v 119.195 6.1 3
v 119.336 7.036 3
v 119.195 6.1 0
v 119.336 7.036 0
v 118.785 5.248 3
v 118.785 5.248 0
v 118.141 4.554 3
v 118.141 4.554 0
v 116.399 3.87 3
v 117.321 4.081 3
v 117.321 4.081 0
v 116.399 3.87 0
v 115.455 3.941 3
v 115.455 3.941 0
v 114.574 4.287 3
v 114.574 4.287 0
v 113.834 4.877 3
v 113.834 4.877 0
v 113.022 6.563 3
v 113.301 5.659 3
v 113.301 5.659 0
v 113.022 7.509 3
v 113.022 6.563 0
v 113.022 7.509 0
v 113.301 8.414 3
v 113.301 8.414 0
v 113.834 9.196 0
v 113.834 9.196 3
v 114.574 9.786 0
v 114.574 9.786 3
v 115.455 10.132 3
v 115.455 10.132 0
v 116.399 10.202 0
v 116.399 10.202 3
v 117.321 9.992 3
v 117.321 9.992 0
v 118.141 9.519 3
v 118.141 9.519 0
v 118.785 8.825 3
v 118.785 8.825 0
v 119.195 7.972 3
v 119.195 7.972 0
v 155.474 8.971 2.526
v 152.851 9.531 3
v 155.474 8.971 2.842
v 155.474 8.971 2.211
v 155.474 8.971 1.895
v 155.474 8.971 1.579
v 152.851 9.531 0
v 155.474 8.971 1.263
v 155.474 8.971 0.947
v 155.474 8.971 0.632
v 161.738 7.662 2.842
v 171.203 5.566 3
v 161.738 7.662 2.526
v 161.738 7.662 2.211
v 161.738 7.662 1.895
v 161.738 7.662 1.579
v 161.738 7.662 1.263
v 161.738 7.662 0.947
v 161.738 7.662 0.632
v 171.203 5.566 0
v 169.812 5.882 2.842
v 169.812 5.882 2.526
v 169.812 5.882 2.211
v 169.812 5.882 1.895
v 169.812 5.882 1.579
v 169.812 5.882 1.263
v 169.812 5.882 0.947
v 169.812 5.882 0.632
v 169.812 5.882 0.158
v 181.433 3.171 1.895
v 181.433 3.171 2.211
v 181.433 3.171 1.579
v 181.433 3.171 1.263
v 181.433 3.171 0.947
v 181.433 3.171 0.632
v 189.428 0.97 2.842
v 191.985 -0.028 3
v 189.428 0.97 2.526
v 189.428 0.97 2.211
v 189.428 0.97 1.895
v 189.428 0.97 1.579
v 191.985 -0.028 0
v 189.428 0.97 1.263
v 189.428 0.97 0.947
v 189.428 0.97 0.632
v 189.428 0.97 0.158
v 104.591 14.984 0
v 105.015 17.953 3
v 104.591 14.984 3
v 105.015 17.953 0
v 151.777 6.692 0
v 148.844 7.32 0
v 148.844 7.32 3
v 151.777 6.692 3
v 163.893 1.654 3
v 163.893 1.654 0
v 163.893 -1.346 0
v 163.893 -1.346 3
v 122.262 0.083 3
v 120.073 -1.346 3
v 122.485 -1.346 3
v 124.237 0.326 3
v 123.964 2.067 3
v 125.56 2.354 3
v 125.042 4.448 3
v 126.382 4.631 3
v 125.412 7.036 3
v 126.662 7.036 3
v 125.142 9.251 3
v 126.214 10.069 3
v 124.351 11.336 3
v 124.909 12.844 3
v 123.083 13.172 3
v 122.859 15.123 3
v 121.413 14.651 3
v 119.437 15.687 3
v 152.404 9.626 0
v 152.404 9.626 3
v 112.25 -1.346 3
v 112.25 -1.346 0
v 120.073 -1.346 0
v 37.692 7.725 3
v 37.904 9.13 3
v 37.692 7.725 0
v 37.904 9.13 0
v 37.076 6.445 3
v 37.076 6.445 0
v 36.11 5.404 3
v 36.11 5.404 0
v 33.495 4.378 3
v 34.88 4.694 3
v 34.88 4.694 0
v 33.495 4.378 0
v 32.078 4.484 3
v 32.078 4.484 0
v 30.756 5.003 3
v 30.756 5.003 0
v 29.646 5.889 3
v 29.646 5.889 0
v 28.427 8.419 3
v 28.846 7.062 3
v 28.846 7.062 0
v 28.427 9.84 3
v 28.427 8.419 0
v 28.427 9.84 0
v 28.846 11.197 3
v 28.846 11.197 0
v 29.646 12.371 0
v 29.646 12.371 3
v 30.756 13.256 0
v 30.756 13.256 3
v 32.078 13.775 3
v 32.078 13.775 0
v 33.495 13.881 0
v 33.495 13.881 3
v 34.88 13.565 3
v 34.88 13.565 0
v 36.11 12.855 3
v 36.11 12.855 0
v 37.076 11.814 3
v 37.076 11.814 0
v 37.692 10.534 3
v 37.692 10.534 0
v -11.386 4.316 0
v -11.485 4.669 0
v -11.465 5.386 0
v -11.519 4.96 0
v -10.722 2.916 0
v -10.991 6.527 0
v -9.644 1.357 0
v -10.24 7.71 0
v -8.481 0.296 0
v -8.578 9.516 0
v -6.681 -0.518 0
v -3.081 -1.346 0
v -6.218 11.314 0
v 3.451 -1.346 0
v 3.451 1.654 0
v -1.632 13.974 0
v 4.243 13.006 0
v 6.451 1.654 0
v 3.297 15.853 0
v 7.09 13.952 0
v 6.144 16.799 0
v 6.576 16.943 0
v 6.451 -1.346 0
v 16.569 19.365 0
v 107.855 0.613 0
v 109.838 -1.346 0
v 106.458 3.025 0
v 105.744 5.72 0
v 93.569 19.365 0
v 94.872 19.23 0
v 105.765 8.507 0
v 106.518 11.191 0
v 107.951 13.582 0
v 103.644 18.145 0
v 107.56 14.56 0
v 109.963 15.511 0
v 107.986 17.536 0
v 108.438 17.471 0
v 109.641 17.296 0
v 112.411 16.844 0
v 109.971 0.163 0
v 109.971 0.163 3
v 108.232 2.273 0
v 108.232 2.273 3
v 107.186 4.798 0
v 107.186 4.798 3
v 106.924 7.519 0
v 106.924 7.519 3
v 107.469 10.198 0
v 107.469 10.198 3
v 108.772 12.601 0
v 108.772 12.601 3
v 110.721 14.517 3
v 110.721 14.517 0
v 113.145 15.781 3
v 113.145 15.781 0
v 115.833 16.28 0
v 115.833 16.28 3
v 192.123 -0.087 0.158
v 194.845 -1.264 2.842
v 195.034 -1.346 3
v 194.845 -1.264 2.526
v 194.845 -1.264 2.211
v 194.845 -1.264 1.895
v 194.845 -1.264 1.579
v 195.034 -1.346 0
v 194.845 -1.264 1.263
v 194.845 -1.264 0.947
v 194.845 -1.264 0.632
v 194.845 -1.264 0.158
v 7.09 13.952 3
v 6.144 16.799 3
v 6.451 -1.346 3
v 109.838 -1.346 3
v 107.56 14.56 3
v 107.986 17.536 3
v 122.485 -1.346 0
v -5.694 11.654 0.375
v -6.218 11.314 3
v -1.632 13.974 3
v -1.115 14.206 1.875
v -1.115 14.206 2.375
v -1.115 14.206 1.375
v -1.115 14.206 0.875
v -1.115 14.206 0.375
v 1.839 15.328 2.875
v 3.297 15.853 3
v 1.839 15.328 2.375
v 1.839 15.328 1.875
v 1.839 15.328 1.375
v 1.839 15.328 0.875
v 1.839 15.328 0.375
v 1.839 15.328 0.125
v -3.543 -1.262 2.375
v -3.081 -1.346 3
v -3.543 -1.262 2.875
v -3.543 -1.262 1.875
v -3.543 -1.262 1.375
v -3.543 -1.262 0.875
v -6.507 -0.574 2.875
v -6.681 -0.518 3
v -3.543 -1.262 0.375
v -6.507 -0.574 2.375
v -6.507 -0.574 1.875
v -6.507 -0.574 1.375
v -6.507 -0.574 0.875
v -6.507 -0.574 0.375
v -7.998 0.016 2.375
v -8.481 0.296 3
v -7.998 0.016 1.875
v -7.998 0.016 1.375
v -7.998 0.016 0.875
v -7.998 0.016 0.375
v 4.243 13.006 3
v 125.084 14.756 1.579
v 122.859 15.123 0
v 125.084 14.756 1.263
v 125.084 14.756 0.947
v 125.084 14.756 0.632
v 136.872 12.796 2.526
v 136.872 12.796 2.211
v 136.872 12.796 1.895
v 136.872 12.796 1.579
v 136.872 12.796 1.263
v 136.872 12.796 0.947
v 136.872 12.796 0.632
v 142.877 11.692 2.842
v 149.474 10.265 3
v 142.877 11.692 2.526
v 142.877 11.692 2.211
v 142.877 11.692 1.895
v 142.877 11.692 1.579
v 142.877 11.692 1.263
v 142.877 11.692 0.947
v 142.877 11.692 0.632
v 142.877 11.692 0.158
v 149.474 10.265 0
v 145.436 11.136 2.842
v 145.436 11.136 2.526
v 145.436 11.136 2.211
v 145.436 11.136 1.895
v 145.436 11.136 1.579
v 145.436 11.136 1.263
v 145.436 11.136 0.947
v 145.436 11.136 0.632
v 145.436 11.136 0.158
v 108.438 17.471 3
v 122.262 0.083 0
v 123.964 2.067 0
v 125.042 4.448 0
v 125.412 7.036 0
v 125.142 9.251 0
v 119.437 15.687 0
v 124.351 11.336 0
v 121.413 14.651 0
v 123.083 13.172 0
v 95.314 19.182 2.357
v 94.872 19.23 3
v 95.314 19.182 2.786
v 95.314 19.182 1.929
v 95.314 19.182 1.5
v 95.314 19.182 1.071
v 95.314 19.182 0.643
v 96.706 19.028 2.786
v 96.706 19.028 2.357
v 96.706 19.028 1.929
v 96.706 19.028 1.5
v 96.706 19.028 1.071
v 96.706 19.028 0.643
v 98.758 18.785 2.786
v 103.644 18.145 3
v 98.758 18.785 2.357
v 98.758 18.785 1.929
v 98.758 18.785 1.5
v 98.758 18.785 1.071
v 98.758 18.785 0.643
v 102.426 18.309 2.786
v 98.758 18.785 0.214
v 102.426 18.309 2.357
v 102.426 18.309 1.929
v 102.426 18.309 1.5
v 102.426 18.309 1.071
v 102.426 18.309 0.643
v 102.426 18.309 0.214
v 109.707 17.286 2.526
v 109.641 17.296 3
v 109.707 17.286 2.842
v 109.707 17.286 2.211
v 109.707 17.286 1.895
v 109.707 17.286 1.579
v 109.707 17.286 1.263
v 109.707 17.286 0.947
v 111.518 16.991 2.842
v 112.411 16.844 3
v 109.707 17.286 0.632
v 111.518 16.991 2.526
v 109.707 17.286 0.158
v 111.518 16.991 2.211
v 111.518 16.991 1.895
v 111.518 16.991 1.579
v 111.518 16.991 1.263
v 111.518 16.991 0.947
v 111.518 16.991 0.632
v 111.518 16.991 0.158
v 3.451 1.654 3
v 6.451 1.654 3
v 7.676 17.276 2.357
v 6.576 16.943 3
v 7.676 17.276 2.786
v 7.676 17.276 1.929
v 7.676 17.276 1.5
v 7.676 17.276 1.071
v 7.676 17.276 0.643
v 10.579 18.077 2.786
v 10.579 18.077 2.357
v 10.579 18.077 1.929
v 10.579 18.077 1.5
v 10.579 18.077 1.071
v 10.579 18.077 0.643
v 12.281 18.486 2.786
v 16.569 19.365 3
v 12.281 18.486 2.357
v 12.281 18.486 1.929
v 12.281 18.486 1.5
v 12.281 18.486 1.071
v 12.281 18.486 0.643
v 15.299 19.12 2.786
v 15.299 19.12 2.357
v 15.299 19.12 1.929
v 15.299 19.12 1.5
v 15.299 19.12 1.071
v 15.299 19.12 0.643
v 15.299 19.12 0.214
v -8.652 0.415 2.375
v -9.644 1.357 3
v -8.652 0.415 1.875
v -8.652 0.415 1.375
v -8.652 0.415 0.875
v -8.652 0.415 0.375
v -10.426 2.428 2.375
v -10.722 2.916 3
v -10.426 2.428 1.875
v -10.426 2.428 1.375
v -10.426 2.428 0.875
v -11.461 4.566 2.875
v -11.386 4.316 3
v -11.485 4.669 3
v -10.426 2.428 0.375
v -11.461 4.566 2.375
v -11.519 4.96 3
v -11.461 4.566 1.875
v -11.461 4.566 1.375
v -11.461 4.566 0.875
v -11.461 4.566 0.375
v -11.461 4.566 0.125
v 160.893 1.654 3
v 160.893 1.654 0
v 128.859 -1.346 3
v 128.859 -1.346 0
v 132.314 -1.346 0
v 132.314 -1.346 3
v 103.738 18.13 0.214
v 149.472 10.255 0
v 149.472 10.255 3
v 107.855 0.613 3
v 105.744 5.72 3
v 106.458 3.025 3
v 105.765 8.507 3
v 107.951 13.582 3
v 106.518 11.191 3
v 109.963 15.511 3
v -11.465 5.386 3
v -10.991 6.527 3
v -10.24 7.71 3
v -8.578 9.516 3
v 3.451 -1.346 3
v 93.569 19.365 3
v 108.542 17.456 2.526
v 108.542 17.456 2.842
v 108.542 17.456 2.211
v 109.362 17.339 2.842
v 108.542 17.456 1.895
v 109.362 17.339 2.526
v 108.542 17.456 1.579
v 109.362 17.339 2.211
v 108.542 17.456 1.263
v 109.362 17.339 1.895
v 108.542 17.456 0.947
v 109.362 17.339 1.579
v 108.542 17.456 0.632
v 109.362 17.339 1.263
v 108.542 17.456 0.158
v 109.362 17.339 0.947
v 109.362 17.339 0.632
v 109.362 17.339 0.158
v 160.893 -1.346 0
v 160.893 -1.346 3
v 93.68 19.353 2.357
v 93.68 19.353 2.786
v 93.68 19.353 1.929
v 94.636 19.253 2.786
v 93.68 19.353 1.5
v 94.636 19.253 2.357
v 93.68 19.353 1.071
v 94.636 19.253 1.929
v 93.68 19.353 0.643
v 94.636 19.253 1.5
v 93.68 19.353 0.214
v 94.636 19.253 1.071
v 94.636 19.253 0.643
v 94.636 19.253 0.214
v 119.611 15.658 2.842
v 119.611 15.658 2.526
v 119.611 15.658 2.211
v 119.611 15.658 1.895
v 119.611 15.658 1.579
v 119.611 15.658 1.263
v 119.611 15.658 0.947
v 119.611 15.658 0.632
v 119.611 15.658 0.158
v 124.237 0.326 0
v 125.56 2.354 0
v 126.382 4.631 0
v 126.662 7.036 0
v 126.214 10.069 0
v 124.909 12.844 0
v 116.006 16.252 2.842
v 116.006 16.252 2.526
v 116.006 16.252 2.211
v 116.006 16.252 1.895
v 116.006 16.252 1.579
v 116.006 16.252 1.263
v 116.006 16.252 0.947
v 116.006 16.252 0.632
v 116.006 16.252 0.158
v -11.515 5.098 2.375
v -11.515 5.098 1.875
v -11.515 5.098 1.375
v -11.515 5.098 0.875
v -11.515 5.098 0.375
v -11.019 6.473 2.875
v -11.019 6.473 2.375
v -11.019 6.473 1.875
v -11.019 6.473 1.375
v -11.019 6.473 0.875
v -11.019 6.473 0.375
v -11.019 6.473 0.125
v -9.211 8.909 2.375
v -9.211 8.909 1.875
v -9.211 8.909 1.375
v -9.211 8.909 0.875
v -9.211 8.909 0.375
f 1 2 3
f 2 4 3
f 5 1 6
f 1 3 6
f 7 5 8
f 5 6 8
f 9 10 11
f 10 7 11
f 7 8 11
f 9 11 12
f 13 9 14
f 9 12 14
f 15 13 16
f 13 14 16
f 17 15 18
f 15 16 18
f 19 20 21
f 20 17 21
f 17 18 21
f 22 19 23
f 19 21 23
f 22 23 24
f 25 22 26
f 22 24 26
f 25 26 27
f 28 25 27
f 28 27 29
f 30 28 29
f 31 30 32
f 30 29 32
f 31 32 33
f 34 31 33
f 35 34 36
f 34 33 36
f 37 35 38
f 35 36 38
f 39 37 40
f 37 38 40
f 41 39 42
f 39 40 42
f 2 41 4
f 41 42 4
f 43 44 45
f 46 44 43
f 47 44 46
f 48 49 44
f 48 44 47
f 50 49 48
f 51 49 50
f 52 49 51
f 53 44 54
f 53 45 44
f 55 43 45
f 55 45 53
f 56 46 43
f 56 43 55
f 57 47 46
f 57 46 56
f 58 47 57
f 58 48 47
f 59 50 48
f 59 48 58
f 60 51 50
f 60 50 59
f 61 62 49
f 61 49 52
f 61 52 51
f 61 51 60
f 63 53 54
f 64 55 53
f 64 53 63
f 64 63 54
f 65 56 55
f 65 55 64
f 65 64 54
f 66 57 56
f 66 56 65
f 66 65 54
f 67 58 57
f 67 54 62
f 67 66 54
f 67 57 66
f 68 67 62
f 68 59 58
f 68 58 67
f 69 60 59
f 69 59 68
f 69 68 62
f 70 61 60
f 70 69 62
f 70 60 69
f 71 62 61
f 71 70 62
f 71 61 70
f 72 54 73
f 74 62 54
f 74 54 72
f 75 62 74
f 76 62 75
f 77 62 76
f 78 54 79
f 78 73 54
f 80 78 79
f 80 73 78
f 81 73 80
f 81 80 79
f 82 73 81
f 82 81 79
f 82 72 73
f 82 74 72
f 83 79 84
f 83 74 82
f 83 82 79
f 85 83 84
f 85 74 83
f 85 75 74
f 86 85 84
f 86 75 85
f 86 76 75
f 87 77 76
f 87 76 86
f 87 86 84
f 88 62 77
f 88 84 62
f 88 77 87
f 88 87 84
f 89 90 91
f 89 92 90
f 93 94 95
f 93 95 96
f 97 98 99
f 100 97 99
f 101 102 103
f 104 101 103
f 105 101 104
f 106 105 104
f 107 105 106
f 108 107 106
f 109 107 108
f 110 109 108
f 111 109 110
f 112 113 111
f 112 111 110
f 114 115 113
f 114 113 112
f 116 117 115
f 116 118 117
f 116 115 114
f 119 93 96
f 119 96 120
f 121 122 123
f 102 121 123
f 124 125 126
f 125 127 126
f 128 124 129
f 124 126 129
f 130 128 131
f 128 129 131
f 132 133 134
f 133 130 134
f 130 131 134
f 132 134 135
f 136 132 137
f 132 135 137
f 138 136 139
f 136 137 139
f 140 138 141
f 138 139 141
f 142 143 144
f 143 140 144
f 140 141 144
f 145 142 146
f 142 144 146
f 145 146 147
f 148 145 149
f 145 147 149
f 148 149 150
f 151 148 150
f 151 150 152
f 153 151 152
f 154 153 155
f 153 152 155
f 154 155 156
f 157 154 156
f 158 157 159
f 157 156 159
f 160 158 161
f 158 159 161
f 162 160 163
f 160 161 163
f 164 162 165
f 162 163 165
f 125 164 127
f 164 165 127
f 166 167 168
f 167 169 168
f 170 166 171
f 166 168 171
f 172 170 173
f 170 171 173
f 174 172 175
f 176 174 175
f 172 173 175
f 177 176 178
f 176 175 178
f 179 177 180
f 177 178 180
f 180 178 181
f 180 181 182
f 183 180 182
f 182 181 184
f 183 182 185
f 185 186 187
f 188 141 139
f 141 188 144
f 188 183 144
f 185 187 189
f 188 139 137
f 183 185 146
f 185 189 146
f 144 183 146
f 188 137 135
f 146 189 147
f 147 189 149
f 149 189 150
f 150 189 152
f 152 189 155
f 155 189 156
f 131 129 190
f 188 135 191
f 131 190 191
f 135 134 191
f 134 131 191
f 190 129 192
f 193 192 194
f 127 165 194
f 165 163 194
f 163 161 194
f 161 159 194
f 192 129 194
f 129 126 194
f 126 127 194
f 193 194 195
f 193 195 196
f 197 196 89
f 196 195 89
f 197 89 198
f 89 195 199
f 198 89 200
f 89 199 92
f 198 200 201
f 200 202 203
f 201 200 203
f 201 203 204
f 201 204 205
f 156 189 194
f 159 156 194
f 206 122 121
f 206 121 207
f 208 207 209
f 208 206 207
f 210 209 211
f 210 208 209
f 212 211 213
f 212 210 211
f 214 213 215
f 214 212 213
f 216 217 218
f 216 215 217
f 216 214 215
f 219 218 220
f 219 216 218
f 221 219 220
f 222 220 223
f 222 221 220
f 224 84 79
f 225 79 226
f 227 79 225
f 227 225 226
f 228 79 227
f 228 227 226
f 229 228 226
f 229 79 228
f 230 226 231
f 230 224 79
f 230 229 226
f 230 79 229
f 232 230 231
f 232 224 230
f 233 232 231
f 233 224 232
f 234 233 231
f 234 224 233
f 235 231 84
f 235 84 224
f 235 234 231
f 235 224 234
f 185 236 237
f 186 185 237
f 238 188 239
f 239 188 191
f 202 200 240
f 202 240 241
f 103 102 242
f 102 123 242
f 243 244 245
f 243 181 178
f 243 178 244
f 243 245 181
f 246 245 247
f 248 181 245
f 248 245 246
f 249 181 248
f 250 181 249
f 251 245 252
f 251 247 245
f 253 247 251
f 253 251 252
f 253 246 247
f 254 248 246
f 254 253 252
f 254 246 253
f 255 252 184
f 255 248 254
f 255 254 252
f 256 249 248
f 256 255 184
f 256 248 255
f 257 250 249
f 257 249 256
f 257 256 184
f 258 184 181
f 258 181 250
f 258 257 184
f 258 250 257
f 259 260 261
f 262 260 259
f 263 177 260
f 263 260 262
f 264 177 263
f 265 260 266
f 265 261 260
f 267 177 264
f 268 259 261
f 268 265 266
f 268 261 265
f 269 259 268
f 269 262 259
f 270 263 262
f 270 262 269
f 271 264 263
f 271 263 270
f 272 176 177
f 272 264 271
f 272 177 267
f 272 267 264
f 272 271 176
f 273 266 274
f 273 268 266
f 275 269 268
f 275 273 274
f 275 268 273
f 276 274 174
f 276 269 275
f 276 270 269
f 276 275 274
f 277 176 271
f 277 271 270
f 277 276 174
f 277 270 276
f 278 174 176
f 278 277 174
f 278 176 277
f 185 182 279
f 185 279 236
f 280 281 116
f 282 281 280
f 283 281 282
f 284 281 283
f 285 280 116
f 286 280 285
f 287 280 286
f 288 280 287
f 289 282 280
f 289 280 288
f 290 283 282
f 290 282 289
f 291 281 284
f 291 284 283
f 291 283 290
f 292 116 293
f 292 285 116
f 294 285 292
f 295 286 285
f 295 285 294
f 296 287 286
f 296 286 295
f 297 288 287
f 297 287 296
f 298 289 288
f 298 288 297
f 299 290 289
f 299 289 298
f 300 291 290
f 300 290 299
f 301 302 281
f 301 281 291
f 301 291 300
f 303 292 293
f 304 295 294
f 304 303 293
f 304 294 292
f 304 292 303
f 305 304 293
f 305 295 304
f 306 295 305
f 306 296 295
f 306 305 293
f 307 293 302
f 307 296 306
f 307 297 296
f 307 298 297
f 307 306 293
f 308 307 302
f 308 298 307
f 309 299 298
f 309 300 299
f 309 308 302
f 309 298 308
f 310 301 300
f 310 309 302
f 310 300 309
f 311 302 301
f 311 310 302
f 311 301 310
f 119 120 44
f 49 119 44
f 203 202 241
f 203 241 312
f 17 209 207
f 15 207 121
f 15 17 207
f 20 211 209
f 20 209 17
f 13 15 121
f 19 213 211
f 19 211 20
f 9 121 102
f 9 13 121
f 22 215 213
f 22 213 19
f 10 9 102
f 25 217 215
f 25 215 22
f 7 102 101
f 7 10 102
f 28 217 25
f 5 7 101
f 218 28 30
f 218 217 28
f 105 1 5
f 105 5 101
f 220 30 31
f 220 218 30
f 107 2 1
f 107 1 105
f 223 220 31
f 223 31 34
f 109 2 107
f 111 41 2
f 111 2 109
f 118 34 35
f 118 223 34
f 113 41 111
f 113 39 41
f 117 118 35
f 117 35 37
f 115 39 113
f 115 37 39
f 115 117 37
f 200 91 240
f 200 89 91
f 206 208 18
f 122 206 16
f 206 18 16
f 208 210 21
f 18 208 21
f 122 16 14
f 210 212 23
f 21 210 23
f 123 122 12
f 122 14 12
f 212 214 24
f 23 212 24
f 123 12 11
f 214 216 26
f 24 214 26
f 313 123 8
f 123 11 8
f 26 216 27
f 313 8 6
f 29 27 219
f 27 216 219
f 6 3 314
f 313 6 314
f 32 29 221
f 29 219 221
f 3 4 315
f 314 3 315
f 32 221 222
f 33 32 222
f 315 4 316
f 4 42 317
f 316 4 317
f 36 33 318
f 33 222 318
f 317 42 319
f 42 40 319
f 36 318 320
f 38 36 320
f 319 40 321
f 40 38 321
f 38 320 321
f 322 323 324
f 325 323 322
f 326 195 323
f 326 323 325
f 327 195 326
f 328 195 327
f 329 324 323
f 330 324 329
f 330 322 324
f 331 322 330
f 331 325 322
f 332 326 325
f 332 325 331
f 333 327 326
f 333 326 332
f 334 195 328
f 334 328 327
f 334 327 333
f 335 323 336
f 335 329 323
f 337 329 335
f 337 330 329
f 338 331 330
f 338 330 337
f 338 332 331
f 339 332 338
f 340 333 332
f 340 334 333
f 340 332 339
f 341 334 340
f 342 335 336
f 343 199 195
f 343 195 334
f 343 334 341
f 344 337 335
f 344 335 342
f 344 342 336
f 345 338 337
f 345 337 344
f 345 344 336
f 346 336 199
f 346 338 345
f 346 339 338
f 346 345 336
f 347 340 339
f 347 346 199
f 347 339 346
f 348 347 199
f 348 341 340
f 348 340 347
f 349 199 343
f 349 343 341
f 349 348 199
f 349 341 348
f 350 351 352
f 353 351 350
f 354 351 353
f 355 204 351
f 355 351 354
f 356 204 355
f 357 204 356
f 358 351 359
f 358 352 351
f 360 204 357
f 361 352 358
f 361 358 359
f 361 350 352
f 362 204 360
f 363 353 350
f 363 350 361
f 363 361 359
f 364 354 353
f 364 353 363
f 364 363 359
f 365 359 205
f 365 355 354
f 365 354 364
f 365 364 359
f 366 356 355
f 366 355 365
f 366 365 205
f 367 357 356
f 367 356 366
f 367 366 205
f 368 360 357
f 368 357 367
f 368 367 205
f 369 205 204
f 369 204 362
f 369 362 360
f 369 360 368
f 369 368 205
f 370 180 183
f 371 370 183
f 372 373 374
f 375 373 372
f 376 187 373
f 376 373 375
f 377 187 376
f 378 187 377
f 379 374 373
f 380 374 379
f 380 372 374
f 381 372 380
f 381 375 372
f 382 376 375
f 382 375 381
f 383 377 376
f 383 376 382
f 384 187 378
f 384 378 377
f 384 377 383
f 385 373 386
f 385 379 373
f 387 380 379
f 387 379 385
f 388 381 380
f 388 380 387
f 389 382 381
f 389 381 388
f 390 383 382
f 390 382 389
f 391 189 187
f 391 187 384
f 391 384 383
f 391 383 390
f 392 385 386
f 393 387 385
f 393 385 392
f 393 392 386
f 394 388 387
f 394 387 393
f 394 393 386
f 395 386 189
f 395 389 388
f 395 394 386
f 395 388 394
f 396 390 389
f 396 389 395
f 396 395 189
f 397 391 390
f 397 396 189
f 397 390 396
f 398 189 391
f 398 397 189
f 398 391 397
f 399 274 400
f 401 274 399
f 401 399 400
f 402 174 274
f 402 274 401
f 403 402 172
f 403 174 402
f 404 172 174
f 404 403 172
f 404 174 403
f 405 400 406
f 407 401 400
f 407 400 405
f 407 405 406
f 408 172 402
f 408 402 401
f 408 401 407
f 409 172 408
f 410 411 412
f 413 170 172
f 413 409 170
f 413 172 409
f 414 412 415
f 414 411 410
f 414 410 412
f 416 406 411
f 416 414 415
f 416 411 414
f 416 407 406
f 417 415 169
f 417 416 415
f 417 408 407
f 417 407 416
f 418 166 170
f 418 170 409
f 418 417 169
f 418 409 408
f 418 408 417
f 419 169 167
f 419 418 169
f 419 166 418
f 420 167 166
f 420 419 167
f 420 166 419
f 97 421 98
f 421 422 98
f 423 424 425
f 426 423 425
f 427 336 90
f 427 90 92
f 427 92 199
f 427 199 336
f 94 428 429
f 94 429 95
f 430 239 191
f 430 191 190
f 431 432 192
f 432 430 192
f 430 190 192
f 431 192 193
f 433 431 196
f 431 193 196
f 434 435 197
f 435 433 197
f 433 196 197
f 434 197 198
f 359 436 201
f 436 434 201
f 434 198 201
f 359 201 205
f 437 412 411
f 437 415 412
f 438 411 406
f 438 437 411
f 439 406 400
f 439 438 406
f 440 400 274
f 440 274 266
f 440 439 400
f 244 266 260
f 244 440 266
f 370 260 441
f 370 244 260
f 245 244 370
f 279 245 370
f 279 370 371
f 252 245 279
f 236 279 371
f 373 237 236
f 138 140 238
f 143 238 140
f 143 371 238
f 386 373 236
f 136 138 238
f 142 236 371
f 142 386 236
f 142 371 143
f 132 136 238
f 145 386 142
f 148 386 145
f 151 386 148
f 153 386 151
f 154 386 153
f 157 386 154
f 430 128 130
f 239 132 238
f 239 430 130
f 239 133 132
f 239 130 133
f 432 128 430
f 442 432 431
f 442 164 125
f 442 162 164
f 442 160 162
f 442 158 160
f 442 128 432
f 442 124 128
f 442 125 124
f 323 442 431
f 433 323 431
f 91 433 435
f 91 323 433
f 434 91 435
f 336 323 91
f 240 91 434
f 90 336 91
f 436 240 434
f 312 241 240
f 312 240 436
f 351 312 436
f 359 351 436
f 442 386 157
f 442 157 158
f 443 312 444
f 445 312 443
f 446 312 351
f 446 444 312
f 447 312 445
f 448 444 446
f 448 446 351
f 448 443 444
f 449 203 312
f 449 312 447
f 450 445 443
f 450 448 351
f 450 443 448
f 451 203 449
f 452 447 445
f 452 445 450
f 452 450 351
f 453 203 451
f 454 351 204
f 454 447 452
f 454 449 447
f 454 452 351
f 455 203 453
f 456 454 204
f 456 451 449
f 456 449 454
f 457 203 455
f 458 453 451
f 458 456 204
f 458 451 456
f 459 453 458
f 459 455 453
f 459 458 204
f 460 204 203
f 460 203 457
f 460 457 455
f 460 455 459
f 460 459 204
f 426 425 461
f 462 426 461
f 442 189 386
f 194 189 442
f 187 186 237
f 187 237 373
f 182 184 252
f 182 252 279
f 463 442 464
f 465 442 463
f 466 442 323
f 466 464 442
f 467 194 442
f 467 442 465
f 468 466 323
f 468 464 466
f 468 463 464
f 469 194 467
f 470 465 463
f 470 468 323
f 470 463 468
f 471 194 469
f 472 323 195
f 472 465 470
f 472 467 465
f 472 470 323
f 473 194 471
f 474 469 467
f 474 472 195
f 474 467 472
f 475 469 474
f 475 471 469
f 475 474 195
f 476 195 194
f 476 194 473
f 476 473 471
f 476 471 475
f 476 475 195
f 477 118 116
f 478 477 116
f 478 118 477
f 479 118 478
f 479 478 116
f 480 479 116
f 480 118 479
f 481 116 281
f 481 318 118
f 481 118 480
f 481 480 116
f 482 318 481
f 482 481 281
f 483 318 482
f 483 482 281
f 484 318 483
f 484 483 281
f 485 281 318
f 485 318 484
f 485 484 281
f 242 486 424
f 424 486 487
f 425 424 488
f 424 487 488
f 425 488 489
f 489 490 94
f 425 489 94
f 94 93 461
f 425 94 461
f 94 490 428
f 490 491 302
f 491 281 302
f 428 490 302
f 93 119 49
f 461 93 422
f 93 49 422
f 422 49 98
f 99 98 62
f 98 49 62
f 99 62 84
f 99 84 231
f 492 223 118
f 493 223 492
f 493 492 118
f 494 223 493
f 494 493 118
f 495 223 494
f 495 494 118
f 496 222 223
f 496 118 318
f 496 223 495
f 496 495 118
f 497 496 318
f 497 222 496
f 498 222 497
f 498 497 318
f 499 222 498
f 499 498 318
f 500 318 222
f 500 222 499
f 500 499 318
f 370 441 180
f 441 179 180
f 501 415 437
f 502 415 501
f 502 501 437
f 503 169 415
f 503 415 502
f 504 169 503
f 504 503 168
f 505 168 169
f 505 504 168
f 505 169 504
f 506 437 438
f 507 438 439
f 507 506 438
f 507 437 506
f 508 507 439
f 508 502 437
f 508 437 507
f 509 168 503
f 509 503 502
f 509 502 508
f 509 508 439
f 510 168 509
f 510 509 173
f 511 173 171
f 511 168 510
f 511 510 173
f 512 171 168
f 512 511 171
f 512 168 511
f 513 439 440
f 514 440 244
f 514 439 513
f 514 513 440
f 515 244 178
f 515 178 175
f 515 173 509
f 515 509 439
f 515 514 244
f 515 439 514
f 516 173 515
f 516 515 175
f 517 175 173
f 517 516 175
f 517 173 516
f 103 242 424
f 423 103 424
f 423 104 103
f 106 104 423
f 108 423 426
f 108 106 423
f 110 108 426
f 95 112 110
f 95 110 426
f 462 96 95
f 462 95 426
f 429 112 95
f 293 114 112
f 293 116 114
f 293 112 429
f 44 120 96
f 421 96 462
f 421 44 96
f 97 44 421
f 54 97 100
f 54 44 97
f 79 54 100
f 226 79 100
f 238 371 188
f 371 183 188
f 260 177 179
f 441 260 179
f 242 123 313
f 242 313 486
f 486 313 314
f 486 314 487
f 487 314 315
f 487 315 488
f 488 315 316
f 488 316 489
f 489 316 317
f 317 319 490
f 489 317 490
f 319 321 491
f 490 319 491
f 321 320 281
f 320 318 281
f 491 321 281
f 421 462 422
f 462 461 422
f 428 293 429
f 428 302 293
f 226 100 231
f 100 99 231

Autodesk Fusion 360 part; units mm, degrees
sketch "Sketch1" plane through (0, 0, 0) normal (0, 0, 1) x (1, 0, 0) in component "Airfoil structure"
  spline S0 degree 5 poles (108.4381, 17.4711) (108.649, 17.4404) (108.9954, 17.3905) (109.2888, 17.35) (109.4947, 17.3216) (110.5176, 17.1554) (112.7992, 16.78) (116.3579, 16.1938) (120.8926, 15.4471) (125.9053, 14.6214) (130.826, 13.8088) (135.1336, 13.0925) (138.4727, 12.5267) (140.7909, 12.1145) (142.442, 11.7905) (143.9925, 11.4539) (145.6494, 11.0874) (147.355, 10.7177) (148.7282, 10.4238) (149.4739, 10.265) knots 0 0 0 0 0 0 0.066667 0.133333 0.2 0.266667 0.333333 0.4 0.466667 0.533333 0.6 0.666667 0.733333 0.8 0.866667 0.933333 1 1 1 1 1 1
  line L0 (104.3157, 18.0708) -> (112.5606, 16.8713)
  line L1 (145.4959, 11.1121) -> (153.4519, 9.4178)
  spline S1 degree 5 poles (152.8506, 9.5306) (153.6754, 9.3537) (155.1958, 9.0286) (157.0885, 8.6275) (158.936, 8.2427) (160.6637, 7.8882) (162.4454, 7.5152) (164.8302, 6.998) (168.0436, 6.2836) (171.9512, 5.3995) (176.2203, 4.4165) (180.4192, 3.4262) (184.1363, 2.5128) (187.0894, 1.7283) (189.2467, 1.0647) (190.9412, 0.4271) (192.3181, -0.1661) (193.5665, -0.7107) (194.5238, -1.1255) (195.0337, -1.3459) knots 0 0 0 0 0 0 0.066667 0.133333 0.2 0.266667 0.333333 0.4 0.466667 0.533333 0.6 0.666667 0.733333 0.8 0.866667 0.933333 1 1 1 1 1 1
  line L2 (148.4907, 10.4656) -> (157.2105, 8.5955)
  line L3 (191.9852, -0.0284) -> (198.0822, -2.6634)
  circle A0 centre (33.1388, 9.1296) radius 4.765
  circle A1 centre (116.1615, 7.0362) radius 3.175
  spline S2 degree 5 poles (-3.081, -1.3459) (-3.6016, -1.2531) (-4.5413, -1.0758) (-5.6462, -0.8349) (-6.5938, -0.5667) (-7.329, -0.2952) (-8.0514, 0.0089) (-9.0194, 0.5708) (-10.0684, 1.7874) (-10.9642, 3.2519) (-11.5103, 4.4866) (-11.5777, 5.0951) (-11.407, 5.643) (-11.0112, 6.6068) (-10.1307, 7.993) (-8.6022, 9.6432) (-6.4034, 11.2721) (-4.1965, 12.5716) (-2.7349, 13.4061) (-1.8316, 13.8946) (-1.0216, 14.2664) (0.0955, 14.6934) (1.459, 15.1917) (2.6392, 15.6173) (3.2971, 15.8534) knots 0 0 0 0 0 0 0.05 0.1 0.15 0.2 0.25 0.3 0.35 0.4 0.45 0.5 0.55 0.6 0.65 0.7 0.75 0.8 0.85 0.9 0.95 1 1 1 1 1 1
  line L4 (0.5703, -1.9966) -> (-6.7323, -0.6952)
  line L5 (-0.0118, 14.6656) -> (6.606, 17.0412)
  line L6 (-8.4792, 9.8153) -> (-3.9569, 12.8132)
  line L7 (-11.5034, 4.2257) -> (-11.5345, 5.6935)
  line L8 (-7.2174, -0.5359) -> (-9.7443, 1.1286)
  line L9 (16.5688, 19.3646) -> (93.5688, 19.3646)
  spline S3 degree 5 poles (93.5688, 19.3646) (93.8188, 19.3387) (94.2829, 19.2905) (94.8714, 19.229) (95.4658, 19.1659) (96.0263, 19.1049) (96.567, 19.0445) (97.2368, 18.9678) (98.1315, 18.8622) (99.3129, 18.7173) (100.8213, 18.5245) (102.3116, 18.3263) (103.5971, 18.1504) (104.5298, 18.0208) (105.015, 17.9529) knots 0 0 0 0 0 0 0.1 0.2 0.3 0.4 0.5 0.6 0.7 0.8 0.9 1 1 1 1 1 1
  line L10 (92.266, 19.4996) -> (94.8715, 19.2297)
  line L11 (103.6445, 18.1447) -> (106.3855, 17.761)
  spline S4 degree 5 poles (6.5765, 16.943) (6.9079, 17.0449) (7.5374, 17.2364) (8.3817, 17.4868) (9.3156, 17.7508) (10.2084, 17.9865) (10.8922, 18.156) (11.4504, 18.29) (11.9864, 18.4184) (12.6265, 18.5675) (13.504, 18.76) (14.4962, 18.9637) (15.447, 19.1503) (16.1786, 19.2906) (16.5688, 19.3646) knots 0 0 0 0 0 0 0.1 0.2 0.3 0.4 0.5 0.6 0.7 0.8 0.9 1 1 1 1 1 1
  line L12 (5.4107, 16.5846) -> (7.7424, 17.3015)
  line L13 (15.2328, 19.111) -> (17.9048, 19.6183)
  line L14 (152.4045, 9.626) -> (152.8506, 9.5306)
  line L15 (107.9857, 17.5357) -> (108.4381, 17.4711)
  line L16 (6.1441, 16.7993) -> (6.5765, 16.943)
  line L17 (128.8588, -1.3459) -> (132.3138, -1.3459)
  line L18 (149.4739, 10.265) -> (148.8437, 7.3202)
  line L19 (148.8437, 7.3202) -> (151.7767, 6.6924)
  line L20 (151.7767, 6.6924) -> (152.4045, 9.626)
  line L21 (105.015, 17.9529) -> (104.5907, 14.9843)
  line L22 (104.5907, 14.9843) -> (107.5603, 14.5598)
  line L23 (107.5603, 14.5598) -> (107.9857, 17.5357)
  line L24 (3.2971, 15.8534) -> (4.243, 13.0064)
  line L25 (4.243, 13.0064) -> (7.09, 13.9524)
  line L26 (7.09, 13.9524) -> (6.1441, 16.7993)
  line L27 (160.8934, -1.3459) -> (160.8934, 1.6536)
  line L28 (160.8934, 1.6536) -> (163.8934, 1.6536)
  line L29 (163.8934, 1.6536) -> (163.8934, -1.3459)
  line L30 (132.3138, -1.3459) -> (160.8934, -1.3459)
  line L31 (163.8934, -1.3459) -> (195.0337, -1.3459)
  line L32 (3.4513, -1.3459) -> (3.4513, 1.6536)
  line L33 (3.4513, 1.6536) -> (6.4513, 1.6536)
  line L34 (6.4513, 1.6536) -> (6.4513, -1.3459)
  line L35 (-3.081, -1.3459) -> (3.4513, -1.3459)
  line L36 (6.4513, -1.3459) -> (128.8588, -1.3459)
  circle A2 centre (116.1615, 7.0362) radius 9.25
  circle A3 centre (116.1615, 7.0362) radius 10.5
  point P0 (-8.4808, 0.2964)
  point P1 (-11.5189, 4.9596)
  point P2 (-6.2181, 11.3142)
  point P3 (11.4183, 18.2822)
  point P4 (96.5722, 19.0435)
  point P5 (109.7252, 17.2828)
  point P6 (137.8534, 12.6279)
  point P7 (163.7248, 7.2358)
  point P8 (186.791, 1.7868)
  dimension "d38" = 77
  dimension "d53" = 9.53
  dimension "d54" = 6.35
  dimension "d60" = 83.0226
  dimension "d64" = 18.5
  dimension "d65" = 21
extrude "Extrude1" add sketch "Sketch1" along normal blind 3 contours S0 L0 S2 L9 S3 L10 L11 S4 L15 L16 L21 L22 L23 L24 L25 L26 L32 L33 L34 L35 L36 A3 | S0 L36 A2 | S0 L36 A2 A3 | S0 S1 L2 L3 L14 L17 L18 L19 L20 L27 L28 L29 L30 L31 L36 A3 picked at (123.1311, 14.2971) makes body 1 at (79.1074, 9.933, 0) makes body 2 at (147.3503, 1.5428, 0) in component "Airfoil structure"
sketch "Sketch3" plane through (0, 0, 0) normal (0, 0, 1) x (1, 0, 0)
component "Airfoil structure" placed x (1, 0, 0) y (0, 1, 0) z (0, 0, 1) at (0, 0, 0)
